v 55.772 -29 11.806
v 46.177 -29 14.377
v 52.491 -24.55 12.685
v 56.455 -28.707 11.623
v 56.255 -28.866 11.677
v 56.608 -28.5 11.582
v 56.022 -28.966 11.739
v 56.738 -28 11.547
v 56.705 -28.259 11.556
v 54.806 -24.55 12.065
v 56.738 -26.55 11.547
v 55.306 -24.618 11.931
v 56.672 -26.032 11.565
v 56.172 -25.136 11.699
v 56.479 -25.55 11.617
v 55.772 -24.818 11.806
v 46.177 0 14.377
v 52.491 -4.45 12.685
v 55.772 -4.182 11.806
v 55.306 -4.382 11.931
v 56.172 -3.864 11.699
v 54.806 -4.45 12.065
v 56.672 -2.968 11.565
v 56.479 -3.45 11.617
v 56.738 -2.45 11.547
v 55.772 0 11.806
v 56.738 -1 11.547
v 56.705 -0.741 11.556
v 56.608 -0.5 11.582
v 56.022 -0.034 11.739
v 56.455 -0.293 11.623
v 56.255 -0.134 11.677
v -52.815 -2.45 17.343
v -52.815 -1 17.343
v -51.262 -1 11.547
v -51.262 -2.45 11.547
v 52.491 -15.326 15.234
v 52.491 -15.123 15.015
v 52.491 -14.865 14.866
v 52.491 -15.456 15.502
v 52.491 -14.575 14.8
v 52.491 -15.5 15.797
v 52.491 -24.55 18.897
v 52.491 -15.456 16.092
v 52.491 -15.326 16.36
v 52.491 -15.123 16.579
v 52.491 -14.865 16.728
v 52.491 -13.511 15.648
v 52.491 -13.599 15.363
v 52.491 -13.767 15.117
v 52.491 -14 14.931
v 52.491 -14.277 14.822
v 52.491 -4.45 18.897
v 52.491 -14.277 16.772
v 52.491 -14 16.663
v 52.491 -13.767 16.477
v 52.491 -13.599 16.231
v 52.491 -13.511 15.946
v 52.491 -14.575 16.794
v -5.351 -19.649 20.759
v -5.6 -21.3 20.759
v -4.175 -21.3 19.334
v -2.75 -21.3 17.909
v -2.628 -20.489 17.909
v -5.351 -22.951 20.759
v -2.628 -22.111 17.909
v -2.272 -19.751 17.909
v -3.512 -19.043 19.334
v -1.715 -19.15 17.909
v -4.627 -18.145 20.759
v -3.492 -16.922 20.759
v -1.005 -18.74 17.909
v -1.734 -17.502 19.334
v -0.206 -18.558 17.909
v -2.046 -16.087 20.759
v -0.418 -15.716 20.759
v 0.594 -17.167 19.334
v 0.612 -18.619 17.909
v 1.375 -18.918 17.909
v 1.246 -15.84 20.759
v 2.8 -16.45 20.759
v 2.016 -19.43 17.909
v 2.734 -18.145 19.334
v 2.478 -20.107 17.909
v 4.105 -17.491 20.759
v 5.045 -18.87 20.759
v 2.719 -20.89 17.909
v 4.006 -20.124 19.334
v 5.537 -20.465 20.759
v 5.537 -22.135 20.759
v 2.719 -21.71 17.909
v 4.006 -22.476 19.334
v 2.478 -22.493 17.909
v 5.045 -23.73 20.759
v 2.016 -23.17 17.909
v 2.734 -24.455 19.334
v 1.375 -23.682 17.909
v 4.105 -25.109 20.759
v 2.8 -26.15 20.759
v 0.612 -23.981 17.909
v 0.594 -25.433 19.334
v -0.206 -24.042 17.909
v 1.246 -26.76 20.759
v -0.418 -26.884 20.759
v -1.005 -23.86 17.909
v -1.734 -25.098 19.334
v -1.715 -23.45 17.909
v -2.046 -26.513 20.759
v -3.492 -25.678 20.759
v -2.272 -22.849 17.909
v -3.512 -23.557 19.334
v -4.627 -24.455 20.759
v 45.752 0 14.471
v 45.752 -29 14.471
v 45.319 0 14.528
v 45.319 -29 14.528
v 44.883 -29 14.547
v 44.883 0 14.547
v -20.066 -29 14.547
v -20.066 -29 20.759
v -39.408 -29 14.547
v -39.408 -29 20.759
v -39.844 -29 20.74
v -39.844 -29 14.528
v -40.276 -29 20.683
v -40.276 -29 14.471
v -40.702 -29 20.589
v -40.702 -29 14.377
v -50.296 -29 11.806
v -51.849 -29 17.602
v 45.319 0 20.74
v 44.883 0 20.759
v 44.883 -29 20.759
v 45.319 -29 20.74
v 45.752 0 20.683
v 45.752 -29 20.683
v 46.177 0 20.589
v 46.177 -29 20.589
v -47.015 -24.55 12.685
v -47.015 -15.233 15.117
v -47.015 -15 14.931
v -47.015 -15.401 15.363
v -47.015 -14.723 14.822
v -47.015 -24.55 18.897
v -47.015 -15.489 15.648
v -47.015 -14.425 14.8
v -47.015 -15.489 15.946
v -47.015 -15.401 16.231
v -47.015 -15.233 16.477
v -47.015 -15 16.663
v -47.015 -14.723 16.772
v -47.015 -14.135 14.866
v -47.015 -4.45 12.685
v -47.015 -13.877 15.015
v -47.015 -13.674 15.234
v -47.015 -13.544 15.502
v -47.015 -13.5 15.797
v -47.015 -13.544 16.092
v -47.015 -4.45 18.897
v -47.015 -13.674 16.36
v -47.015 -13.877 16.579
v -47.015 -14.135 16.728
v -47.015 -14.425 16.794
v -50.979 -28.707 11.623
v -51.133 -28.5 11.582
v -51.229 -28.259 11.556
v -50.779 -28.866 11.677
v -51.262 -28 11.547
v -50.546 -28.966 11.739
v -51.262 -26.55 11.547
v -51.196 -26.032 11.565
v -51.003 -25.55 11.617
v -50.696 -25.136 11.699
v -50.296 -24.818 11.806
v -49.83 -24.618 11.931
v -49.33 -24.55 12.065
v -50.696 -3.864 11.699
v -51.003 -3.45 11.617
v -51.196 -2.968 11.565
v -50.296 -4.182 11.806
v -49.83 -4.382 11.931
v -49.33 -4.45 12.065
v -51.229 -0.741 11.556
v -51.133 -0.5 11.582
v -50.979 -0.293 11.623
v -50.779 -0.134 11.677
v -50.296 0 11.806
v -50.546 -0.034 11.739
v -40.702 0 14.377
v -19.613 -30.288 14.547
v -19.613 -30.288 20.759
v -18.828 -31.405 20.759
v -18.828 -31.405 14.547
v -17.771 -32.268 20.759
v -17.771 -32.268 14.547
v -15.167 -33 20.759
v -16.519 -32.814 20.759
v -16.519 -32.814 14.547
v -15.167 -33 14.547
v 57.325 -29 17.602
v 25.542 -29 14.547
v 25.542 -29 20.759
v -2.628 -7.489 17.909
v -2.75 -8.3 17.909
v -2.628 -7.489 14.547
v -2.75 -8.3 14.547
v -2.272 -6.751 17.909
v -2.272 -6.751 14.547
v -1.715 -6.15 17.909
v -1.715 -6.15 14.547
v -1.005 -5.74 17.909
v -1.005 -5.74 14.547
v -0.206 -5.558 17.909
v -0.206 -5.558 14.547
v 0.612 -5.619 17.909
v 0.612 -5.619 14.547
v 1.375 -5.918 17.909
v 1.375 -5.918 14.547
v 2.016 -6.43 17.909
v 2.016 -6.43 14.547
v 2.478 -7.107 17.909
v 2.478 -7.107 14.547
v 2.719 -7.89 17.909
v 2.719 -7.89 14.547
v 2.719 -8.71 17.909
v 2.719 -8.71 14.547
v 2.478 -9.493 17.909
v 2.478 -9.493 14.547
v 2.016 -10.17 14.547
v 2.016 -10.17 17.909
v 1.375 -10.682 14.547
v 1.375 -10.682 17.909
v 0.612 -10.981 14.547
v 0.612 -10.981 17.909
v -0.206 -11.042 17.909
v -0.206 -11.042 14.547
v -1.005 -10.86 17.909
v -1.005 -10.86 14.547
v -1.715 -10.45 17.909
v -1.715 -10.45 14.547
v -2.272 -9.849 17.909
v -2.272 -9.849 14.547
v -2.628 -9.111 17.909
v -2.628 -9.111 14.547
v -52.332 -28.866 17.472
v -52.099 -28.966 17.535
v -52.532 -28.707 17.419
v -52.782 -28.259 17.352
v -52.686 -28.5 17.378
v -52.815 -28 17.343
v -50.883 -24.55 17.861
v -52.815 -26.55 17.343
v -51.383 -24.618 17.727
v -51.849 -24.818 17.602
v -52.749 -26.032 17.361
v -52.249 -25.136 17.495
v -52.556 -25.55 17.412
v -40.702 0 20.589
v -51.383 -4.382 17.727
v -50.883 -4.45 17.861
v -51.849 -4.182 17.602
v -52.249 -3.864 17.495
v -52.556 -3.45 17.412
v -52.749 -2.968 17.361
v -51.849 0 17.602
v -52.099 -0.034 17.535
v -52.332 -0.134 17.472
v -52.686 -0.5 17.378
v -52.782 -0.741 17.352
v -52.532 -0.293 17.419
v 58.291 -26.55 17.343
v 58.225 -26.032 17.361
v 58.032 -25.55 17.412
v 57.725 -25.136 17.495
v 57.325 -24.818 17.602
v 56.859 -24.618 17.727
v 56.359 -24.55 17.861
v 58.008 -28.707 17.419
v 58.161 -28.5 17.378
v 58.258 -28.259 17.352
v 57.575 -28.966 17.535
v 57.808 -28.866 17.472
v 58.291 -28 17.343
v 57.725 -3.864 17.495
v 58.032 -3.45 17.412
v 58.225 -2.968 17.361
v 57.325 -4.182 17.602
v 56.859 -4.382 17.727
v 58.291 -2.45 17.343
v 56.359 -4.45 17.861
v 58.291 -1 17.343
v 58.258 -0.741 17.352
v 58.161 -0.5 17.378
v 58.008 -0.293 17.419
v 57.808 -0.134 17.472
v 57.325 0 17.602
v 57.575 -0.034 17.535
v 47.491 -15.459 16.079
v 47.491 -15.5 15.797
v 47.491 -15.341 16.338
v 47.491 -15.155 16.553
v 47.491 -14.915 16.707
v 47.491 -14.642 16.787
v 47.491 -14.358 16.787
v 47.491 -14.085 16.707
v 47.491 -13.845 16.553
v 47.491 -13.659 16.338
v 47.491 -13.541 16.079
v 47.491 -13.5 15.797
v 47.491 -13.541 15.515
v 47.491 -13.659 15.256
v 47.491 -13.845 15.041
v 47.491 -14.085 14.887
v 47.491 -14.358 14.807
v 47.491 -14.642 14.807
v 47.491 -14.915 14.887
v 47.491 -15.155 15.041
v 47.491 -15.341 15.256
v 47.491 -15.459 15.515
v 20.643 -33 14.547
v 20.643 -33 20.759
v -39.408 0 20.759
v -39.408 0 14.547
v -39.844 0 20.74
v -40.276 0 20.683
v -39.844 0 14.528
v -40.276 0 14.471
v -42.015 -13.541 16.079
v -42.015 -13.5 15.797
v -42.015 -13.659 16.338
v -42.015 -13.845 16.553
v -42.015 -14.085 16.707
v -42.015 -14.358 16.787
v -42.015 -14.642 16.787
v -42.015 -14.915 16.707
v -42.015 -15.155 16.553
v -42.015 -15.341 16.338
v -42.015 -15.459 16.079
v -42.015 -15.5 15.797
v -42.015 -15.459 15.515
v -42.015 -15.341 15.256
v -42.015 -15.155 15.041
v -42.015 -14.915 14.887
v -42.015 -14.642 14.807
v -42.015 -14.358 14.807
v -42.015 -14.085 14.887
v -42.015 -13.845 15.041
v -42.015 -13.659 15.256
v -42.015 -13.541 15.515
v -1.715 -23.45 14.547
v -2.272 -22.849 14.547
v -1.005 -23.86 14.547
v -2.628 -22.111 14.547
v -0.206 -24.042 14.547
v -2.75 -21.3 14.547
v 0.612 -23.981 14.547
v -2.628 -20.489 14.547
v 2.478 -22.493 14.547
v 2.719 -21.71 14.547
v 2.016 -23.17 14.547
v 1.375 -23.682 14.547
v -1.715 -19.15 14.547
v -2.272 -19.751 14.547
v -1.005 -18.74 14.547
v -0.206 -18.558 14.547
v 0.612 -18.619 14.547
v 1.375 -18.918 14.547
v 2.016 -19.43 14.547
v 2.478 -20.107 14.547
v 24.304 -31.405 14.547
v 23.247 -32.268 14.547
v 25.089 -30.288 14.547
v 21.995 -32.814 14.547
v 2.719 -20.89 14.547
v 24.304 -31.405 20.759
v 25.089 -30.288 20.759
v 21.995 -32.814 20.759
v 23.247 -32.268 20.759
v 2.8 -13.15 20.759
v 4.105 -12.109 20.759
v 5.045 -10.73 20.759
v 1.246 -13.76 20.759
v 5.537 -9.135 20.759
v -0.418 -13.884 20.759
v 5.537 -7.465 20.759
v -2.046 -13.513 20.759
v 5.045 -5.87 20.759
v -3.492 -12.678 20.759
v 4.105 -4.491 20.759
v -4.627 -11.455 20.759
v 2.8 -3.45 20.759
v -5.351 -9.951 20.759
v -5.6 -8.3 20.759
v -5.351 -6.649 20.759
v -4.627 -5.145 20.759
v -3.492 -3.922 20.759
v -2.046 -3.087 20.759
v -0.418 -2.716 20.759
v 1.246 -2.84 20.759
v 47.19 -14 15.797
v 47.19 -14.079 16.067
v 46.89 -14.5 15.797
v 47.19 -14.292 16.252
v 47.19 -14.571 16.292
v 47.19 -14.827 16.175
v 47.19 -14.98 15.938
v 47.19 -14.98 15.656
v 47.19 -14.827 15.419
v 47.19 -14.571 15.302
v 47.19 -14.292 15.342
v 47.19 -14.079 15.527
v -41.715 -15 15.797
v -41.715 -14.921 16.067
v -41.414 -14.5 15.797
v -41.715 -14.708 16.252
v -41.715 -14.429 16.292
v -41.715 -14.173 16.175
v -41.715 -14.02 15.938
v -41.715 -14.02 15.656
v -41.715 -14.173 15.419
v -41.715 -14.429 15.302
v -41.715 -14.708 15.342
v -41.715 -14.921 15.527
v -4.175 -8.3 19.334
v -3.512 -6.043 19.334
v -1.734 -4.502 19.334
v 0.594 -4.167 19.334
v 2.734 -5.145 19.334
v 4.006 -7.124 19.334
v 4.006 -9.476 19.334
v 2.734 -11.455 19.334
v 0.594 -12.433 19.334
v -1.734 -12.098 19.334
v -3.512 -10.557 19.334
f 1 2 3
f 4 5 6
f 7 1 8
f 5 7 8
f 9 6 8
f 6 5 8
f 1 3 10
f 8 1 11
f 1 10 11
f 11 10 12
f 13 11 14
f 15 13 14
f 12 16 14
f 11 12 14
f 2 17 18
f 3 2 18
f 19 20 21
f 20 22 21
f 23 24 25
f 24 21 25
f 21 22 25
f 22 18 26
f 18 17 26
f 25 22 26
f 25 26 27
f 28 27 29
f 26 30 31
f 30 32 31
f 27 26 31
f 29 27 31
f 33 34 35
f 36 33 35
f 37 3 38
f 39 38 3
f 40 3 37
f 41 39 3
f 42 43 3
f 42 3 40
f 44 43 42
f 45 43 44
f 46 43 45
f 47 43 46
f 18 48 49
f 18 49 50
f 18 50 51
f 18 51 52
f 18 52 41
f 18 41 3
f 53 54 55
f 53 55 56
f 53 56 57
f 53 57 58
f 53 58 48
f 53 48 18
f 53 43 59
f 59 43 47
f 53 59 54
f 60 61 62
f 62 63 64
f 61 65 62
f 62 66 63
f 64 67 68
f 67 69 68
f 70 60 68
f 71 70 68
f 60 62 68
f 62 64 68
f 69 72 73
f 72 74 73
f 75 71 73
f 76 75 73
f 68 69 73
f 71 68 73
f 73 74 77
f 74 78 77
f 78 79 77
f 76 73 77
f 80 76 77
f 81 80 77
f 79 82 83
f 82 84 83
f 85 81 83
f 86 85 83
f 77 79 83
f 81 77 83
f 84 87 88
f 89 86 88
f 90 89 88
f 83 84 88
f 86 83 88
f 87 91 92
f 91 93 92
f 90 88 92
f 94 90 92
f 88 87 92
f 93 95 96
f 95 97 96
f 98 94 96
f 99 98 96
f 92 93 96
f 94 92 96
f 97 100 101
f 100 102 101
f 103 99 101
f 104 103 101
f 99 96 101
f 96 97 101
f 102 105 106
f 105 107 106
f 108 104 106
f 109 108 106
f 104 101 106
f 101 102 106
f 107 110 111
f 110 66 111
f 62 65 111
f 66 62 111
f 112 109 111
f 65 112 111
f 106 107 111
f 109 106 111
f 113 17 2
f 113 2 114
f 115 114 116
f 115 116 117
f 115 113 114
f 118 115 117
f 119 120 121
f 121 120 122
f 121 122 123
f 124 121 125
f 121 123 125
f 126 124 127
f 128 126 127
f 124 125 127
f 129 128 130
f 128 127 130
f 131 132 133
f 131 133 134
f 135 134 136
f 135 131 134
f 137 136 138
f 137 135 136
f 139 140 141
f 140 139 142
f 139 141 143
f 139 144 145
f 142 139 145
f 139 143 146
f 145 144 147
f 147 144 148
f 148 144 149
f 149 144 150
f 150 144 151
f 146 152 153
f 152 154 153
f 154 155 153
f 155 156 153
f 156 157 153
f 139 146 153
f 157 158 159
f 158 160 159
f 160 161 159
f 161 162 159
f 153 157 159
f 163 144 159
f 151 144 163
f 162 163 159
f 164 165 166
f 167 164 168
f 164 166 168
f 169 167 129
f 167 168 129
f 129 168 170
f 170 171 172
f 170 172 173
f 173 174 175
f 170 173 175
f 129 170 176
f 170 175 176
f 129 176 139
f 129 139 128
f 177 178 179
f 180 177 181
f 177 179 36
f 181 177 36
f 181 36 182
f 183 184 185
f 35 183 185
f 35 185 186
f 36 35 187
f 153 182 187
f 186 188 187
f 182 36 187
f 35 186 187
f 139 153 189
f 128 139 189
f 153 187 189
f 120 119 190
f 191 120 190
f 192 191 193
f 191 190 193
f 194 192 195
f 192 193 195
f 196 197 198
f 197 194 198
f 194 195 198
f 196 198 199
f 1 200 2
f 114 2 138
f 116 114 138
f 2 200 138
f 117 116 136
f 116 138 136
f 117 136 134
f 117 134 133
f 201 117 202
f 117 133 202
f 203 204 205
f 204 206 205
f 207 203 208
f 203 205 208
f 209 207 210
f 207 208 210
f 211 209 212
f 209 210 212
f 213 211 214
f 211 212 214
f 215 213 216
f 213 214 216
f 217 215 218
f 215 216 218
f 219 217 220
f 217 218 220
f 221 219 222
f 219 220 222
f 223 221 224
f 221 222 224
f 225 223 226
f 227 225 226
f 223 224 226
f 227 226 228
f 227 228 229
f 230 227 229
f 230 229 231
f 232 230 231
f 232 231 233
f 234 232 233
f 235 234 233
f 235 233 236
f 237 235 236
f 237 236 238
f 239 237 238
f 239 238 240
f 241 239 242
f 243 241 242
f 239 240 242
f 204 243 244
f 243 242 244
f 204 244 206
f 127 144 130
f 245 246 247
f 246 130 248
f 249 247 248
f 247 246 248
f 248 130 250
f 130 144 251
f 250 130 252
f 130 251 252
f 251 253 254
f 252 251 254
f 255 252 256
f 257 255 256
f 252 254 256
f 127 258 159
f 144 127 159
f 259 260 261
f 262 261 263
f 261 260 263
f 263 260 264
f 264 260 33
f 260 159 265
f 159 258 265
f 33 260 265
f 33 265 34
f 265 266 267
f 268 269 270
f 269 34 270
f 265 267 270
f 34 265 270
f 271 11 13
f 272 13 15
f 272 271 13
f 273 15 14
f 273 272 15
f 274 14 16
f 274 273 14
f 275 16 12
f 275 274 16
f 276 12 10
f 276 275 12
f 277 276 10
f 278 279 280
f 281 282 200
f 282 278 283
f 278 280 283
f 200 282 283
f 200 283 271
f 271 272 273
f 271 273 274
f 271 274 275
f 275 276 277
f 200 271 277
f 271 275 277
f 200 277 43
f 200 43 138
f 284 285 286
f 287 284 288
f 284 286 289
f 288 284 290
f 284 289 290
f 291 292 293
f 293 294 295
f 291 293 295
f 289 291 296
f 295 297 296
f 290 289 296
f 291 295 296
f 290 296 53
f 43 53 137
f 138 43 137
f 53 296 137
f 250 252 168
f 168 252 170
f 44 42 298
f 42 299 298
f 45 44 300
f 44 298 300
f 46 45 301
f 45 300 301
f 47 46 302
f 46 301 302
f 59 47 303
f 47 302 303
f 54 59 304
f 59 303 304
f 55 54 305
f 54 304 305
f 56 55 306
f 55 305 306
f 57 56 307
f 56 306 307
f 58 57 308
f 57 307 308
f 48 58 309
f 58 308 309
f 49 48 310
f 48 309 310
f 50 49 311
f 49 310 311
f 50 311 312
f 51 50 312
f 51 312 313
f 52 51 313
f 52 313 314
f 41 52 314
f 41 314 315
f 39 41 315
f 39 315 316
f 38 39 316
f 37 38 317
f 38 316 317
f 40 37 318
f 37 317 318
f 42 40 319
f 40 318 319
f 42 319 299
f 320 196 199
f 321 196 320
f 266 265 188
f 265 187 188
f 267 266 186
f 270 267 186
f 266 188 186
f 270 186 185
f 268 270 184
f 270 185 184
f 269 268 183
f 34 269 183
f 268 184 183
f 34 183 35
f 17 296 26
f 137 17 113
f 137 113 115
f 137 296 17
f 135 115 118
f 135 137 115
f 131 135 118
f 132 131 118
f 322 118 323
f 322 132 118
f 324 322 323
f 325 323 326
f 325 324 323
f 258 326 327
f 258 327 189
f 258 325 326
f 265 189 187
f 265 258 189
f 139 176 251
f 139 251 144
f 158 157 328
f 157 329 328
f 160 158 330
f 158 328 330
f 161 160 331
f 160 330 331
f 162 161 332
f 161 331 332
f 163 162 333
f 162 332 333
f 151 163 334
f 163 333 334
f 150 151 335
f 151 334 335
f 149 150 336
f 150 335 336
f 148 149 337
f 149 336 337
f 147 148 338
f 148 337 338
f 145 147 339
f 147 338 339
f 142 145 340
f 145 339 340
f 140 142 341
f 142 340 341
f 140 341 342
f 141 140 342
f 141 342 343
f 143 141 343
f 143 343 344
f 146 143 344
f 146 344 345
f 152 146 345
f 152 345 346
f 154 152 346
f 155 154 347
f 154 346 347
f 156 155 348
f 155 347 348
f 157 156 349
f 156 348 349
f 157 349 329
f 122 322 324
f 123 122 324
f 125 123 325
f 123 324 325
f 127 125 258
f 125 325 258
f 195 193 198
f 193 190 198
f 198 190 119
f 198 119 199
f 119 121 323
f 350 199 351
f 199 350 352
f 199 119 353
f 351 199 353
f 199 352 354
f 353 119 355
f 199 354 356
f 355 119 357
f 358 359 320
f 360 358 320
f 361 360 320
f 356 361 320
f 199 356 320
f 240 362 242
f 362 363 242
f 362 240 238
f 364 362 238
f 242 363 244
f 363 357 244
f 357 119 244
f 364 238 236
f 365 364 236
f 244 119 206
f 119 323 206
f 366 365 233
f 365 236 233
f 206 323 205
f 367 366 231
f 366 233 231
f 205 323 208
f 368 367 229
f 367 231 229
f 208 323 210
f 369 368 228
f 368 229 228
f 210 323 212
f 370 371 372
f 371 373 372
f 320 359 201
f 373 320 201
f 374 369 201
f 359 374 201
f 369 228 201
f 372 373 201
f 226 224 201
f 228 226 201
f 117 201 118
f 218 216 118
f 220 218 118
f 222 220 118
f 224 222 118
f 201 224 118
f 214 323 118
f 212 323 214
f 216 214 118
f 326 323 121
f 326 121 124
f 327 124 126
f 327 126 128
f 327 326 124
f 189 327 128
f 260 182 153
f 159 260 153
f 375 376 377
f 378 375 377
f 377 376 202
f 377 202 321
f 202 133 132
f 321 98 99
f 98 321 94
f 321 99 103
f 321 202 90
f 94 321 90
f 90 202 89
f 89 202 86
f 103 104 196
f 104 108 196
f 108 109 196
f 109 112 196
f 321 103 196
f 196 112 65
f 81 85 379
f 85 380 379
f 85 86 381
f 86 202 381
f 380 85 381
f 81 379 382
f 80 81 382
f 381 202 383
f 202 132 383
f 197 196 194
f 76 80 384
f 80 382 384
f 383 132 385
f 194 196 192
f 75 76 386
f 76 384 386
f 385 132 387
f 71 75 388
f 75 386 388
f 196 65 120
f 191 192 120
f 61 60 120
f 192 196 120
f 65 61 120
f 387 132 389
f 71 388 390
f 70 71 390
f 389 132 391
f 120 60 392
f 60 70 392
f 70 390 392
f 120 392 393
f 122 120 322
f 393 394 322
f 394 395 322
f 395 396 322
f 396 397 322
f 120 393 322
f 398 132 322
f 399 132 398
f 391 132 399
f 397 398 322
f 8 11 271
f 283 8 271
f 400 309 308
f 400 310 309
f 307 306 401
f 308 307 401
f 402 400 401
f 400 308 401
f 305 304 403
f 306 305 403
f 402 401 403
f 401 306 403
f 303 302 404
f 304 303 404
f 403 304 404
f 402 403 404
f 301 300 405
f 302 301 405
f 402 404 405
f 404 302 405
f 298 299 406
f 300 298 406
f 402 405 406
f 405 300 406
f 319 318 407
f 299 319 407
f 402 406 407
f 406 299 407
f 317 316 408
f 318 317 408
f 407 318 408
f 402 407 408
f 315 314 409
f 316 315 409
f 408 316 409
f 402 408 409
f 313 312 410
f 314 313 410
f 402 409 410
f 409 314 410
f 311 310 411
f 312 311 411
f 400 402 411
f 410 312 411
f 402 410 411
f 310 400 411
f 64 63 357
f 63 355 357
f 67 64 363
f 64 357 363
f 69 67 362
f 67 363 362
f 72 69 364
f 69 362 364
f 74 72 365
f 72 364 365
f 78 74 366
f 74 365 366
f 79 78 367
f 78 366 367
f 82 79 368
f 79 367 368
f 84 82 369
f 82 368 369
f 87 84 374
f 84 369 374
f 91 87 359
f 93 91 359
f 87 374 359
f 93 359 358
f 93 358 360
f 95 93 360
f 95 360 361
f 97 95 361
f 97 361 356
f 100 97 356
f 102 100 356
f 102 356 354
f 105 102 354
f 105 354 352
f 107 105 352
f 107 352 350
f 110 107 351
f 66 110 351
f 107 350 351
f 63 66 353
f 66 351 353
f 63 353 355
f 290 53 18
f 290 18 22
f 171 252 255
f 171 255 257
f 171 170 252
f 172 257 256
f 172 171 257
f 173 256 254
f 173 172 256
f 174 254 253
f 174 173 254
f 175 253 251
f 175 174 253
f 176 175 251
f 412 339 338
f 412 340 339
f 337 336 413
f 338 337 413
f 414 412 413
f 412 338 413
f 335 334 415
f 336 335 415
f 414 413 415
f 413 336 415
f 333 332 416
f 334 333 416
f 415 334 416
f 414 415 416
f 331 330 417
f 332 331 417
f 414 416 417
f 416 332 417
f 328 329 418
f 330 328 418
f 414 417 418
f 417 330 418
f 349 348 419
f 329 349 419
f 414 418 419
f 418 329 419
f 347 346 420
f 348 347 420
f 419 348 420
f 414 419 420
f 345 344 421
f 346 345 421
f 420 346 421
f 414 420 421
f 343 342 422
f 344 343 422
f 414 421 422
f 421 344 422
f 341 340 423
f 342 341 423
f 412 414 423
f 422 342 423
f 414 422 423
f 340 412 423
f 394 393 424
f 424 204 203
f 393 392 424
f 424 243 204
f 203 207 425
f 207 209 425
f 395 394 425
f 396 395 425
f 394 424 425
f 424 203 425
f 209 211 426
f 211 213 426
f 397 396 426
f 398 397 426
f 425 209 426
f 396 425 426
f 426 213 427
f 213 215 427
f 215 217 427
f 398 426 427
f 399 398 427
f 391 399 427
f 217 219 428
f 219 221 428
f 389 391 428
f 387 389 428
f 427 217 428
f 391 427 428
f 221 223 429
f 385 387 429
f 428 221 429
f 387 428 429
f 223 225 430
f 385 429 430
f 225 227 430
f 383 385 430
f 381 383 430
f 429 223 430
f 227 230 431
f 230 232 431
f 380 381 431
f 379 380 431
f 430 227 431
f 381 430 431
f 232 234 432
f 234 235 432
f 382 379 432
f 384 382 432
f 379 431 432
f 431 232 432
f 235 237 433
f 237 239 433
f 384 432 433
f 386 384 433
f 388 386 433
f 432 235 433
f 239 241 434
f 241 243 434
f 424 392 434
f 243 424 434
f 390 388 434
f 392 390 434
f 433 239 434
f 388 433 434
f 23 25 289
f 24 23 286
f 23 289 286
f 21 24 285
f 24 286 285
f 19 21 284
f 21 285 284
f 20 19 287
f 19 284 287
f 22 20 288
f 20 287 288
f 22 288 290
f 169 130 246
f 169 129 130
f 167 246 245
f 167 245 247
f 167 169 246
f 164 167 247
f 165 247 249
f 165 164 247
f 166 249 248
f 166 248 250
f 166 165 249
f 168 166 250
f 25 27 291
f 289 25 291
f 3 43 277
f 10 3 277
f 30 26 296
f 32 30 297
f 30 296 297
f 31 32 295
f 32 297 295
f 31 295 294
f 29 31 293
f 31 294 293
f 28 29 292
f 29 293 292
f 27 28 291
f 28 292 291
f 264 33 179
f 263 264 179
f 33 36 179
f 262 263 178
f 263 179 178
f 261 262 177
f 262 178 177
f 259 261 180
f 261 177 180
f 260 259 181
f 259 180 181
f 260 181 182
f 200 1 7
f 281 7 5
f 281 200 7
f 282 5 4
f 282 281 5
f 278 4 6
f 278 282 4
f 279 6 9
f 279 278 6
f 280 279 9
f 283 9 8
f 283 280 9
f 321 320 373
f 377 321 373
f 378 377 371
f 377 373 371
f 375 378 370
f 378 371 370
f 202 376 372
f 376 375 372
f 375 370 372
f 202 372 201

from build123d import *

# Parameters (mm, degrees)
F1_DEPTH        = 29
F2_W            = 45.6076951546
F2_H            = 6.2116570825
F3_DEPTH        = 4
F4_W            = 14.4515829202
F4_H            = 20.1
F4_W_2          = 11.8
F5_DEPTH        = 25
F7_D            = 2
F7_DEPTH        = 5
F7_TIP          = 0.600860619
F8_T1_DEPTH     = 29
F8_T3_DEPTH     = 29
F8_T5_DEPTH     = 32.2913124397
F8_T7_DEPTH     = 32.2913124397
F8_T9_DEPTH     = 30.7065545103
F8_T11_DEPTH    = 30.7065545103
F9_R            = 1
F11_D           = 2
F11_DEPTH       = 5
F11_TIP         = 0.600860619
F12_R           = 2
F14_D           = 5.5
F14_CSINK_D     = 11.2
F14_CSINK_ANGLE = 90


# Not quite as in the source:
# - a fillet or chamfer that OpenCascade refuses, or shapes differently, is made with other operations: its cross-section is extruded or revolved along the edge and cut away or added


with BuildPart() as f1:
    # F0 (on Front) → F1 (new body)
    with BuildSketch(Plane.XZ):
        Polygon((45.541646846, 20.7590438725), (-40.0660483086, 20.7590438725), (-52.8151150019, 17.3429417477), (-51.2622007313, 11.54738679), (-40.0660483086, 14.54738679), (45.541646846, 14.54738679), (56.7377992687, 11.54738679), (58.2907135393, 17.3429417477), align=None)
    extrude(amount=F1_DEPTH)

    # F2 (on face) → F3 (join)
    with BuildSketch(Plane.XZ.offset(29)):
        with Locations((2.7377992687, 17.6532153312)):
            Rectangle(F2_W, F2_H)
    extrude(amount=F3_DEPTH)

    # F4 (on face) → F5 (cut)
    with BuildSketch(Plane.XY.offset(20.7590438725)):
        with Locations((-54.240906462, -14.5)):
            Rectangle(F4_W, F4_H)
        with Locations((58.3907135393, -14.5)):
            Rectangle(F4_W_2, F4_H)
    extrude(amount=-F5_DEPTH, mode=Mode.SUBTRACT)

    # F7
    with Locations(Plane(origin=(-47.0151150019, 0, 0), x_dir=(0, -1, 0), z_dir=(-1, 0, 0))):
        with Locations((14.5, 15.7970470638)):
            Hole(F7_D / 2, depth=F7_DEPTH)
            with Locations((0, 0, -(F7_DEPTH + F7_TIP / 2))):  # 118° drill point
                Cone(0, F7_D / 2, F7_TIP, mode=Mode.SUBTRACT)

    # F8: fillet of radius 5 on 6 edges, made by hand

    # F8_s2 → F8_t1 (join)
    with BuildSketch(Plane.XZ):
        with BuildLine():
            ThreePointArc((46.1774795836, 14.3770159214), (45.5360153192, 14.5046110969), (44.8833843581, 14.54738679))
            Line((44.8833843581, 14.54738679), (45.541646846, 14.54738679))
            Line((45.541646846, 14.54738679), (46.1774795836, 14.3770159214))
        make_face()
    extrude(amount=F8_T1_DEPTH)

    # F8_s4 → F8_t3 (join)
    with BuildSketch(Plane.XZ):
        with BuildLine():
            ThreePointArc((-39.4077858206, 14.54738679), (-40.0604167817, 14.5046110969), (-40.7018810462, 14.3770159214))
            Line((-40.7018810462, 14.3770159214), (-40.0660483086, 14.54738679))
            Line((-40.0660483086, 14.54738679), (-39.4077858206, 14.54738679))
        make_face()
    extrude(amount=F8_T3_DEPTH)

    # F8_s6 → F8_t5 (cut)
    with BuildSketch(Plane.XZ.offset(-1.6456562198)):
        with BuildLine():
            ThreePointArc((44.8833843581, 20.7590438725), (45.5360153192, 20.7162681793), (46.1774795836, 20.5886730039))
            Line((46.1774795836, 20.5886730039), (45.541646846, 20.7590438725))
            Line((45.541646846, 20.7590438725), (44.8833843581, 20.7590438725))
        make_face()
    extrude(amount=F8_T5_DEPTH, mode=Mode.SUBTRACT)

    # F8_s8 → F8_t7 (cut)
    with BuildSketch(Plane.XZ.offset(-1.6456562198)):
        with BuildLine():
            ThreePointArc((-39.4077858206, 20.7590438725), (-40.0604167817, 20.7162681793), (-40.7018810462, 20.5886730039))
            Line((-40.7018810462, 20.5886730039), (-40.0660483086, 20.7590438725))
            Line((-40.0660483086, 20.7590438725), (-39.4077858206, 20.7590438725))
        make_face()
    extrude(amount=F8_T7_DEPTH, mode=Mode.SUBTRACT)

    # F8_s10 → F8_t9 (cut)
    with BuildSketch(Plane.XY.offset(2.2999380761)):
        with BuildLine():
            ThreePointArc((20.6426673604, -33), (23.8049450206, -31.8729833462), (25.541646846, -29))
            Line((25.541646846, -29), (25.541646846, -33))
            Line((25.541646846, -33), (20.6426673604, -33))
        make_face()
    extrude(amount=F8_T9_DEPTH, mode=Mode.SUBTRACT)

    # F8_s12 → F8_t11 (cut)
    with BuildSketch(Plane.XY.offset(2.2999380761)):
        with BuildLine():
            ThreePointArc((-20.0660483086, -29), (-18.3293464832, -31.8729833462), (-15.167068823, -33))
            Line((-15.167068823, -33), (-20.0660483086, -33))
            Line((-20.0660483086, -33), (-20.0660483086, -29))
        make_face()
    extrude(amount=F8_T11_DEPTH, mode=Mode.SUBTRACT)

    # F9
    f9_edges = [f1.edges().sort_by_distance(p)[0] for p in [
        (-52.038658, -29, 14.445164),
        (-52.038658, 0, 14.445164),
        (57.514256, 0, 14.445164),
        (57.514256, -29, 14.445164),
    ]]
    fillet(f9_edges, radius=F9_R)

    # F11
    with Locations(Plane.YZ.offset(52.4907135393)):
        with Locations((-14.5, 15.7970470638)):
            Hole(F11_D / 2, depth=F11_DEPTH)
            with Locations((0, 0, -(F11_DEPTH + F11_TIP / 2))):  # 118° drill point
                Cone(0, F11_D / 2, F11_TIP, mode=Mode.SUBTRACT)

    # F12
    f12_edges = [f1.edges().sort_by_distance(p)[0] for p in [
        (-52.038658, -24.55, 14.445164),
        (-52.038658, -4.45, 14.445164),
        (57.514256, -24.55, 14.445164),
        (57.514256, -4.45, 14.445164),
    ]]
    fillet(f12_edges, radius=F12_R)

    # F14 (through all)
    with Locations(Plane.XY.offset(20.7590438725)):
        with Locations((0, -21.3), (0, -8.3)):
            CounterSinkHole(F14_D / 2, F14_CSINK_D / 2, counter_sink_angle=F14_CSINK_ANGLE)


solid = f1.part
